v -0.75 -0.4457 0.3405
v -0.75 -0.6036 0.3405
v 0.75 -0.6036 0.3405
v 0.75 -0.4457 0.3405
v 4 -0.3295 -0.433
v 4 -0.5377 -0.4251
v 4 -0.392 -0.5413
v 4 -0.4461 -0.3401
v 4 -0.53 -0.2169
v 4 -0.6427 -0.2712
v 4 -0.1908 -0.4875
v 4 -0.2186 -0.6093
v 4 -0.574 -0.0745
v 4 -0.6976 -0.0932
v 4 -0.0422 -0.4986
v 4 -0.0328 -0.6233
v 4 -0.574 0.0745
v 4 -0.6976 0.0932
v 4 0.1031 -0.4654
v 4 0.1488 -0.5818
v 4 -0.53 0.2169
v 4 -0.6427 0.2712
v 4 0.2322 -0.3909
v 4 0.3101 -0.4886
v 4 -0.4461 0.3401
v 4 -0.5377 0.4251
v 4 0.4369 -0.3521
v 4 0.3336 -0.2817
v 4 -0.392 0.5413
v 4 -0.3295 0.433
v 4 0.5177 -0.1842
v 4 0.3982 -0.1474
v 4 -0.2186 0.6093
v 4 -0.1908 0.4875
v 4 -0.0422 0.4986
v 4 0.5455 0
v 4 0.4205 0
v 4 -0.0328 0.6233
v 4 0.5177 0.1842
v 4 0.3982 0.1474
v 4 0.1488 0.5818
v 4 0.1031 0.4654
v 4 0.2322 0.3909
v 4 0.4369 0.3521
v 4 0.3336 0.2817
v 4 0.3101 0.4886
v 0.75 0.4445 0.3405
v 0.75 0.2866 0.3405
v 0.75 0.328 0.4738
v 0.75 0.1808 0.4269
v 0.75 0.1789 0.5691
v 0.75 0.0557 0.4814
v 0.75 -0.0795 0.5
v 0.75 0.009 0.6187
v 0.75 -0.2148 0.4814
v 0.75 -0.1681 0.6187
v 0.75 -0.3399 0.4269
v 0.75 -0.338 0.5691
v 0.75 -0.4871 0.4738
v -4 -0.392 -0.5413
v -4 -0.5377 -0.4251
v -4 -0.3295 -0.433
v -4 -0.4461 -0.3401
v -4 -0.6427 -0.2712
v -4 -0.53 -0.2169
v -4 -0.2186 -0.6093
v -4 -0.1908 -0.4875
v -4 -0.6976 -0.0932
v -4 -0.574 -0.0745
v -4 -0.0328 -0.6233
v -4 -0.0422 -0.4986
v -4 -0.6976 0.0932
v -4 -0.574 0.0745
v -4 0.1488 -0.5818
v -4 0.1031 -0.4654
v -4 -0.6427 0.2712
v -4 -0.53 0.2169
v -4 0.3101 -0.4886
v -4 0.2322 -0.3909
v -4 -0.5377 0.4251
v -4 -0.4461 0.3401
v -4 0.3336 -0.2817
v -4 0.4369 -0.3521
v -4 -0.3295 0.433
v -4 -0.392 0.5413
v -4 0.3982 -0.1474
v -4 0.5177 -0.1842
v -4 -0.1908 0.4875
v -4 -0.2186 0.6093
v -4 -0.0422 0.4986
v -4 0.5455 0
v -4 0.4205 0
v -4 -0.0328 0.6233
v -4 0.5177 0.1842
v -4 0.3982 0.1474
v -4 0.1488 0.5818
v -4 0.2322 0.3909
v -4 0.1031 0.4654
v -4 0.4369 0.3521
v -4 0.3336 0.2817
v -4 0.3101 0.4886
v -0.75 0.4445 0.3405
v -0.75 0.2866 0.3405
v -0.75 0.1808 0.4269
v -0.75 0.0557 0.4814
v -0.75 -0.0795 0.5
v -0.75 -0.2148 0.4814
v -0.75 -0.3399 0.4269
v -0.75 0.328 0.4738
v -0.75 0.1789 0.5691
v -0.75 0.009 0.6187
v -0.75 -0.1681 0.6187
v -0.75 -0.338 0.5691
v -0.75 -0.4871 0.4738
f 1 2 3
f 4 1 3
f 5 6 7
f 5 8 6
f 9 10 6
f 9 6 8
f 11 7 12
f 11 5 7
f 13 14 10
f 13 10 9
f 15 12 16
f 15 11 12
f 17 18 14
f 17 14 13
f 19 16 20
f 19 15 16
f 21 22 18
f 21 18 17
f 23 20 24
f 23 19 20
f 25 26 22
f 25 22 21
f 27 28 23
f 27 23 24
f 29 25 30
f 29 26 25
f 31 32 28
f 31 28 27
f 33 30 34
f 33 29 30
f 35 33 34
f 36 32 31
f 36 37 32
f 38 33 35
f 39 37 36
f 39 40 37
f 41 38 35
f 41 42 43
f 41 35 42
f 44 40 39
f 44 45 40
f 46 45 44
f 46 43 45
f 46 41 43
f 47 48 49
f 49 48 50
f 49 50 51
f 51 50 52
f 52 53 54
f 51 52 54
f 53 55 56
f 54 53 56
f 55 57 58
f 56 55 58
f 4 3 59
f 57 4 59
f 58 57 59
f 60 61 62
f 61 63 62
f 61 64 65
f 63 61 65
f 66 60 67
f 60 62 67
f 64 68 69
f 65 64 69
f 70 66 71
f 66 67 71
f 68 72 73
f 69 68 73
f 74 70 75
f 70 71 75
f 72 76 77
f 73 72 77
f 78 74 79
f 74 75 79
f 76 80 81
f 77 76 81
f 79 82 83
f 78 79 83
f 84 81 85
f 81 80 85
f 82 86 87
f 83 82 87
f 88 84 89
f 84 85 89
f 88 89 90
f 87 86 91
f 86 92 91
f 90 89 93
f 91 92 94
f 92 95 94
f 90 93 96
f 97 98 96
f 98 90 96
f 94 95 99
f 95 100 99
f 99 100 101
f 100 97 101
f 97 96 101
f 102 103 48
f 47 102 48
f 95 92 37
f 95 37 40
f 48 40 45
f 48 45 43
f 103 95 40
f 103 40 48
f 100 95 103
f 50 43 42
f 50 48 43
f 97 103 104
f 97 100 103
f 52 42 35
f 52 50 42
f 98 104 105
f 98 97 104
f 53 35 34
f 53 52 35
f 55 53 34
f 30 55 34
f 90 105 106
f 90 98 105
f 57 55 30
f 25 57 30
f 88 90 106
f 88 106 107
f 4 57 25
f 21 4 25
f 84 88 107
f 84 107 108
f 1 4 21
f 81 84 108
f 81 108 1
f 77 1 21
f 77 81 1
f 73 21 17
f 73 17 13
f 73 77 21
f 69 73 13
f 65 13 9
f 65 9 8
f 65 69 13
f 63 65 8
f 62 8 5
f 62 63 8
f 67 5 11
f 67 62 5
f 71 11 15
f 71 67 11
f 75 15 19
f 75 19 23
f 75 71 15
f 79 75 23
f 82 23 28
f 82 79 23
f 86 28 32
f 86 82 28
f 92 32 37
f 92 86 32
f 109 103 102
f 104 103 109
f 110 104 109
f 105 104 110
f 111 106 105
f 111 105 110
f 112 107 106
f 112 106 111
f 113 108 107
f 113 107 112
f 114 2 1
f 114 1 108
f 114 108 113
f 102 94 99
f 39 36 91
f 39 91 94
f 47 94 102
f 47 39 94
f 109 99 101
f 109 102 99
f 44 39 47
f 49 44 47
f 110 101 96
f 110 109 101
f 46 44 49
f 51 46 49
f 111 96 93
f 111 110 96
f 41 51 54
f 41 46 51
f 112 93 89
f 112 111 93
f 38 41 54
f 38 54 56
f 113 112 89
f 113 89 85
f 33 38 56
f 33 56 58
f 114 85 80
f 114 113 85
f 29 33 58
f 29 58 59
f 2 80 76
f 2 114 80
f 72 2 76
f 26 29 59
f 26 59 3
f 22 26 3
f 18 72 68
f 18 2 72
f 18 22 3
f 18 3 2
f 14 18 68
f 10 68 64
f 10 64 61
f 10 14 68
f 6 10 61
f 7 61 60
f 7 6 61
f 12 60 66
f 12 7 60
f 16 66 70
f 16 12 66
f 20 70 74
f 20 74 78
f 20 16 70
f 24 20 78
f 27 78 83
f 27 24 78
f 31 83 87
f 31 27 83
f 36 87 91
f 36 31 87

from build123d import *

# Parameters (mm, degrees)
F0_R     = 0.625
F0_R_2   = 0.5
F1_DEPTH = 4
F2_W     = 1.5
F2_H     = 0.5
F3_DEPTH = 1


with BuildPart() as f1:
    # F0 (on Right) → F1 (new body, symmetric)
    with BuildSketch(Plane.YZ):
        with Locations((-0.079547, 0)):
            Circle(F0_R)
        with Locations((-0.079547, 0)):
            Circle(F0_R_2, mode=Mode.SUBTRACT)
    extrude(amount=F1_DEPTH, both=True)

    # F2 (on Front) → F3 (cut, symmetric)
    with BuildSketch(Plane.XZ):
        with Locations((0, 0.590535)):
            Rectangle(F2_W, F2_H)
    extrude(amount=F3_DEPTH, both=True, mode=Mode.SUBTRACT)


solid = f1.part
